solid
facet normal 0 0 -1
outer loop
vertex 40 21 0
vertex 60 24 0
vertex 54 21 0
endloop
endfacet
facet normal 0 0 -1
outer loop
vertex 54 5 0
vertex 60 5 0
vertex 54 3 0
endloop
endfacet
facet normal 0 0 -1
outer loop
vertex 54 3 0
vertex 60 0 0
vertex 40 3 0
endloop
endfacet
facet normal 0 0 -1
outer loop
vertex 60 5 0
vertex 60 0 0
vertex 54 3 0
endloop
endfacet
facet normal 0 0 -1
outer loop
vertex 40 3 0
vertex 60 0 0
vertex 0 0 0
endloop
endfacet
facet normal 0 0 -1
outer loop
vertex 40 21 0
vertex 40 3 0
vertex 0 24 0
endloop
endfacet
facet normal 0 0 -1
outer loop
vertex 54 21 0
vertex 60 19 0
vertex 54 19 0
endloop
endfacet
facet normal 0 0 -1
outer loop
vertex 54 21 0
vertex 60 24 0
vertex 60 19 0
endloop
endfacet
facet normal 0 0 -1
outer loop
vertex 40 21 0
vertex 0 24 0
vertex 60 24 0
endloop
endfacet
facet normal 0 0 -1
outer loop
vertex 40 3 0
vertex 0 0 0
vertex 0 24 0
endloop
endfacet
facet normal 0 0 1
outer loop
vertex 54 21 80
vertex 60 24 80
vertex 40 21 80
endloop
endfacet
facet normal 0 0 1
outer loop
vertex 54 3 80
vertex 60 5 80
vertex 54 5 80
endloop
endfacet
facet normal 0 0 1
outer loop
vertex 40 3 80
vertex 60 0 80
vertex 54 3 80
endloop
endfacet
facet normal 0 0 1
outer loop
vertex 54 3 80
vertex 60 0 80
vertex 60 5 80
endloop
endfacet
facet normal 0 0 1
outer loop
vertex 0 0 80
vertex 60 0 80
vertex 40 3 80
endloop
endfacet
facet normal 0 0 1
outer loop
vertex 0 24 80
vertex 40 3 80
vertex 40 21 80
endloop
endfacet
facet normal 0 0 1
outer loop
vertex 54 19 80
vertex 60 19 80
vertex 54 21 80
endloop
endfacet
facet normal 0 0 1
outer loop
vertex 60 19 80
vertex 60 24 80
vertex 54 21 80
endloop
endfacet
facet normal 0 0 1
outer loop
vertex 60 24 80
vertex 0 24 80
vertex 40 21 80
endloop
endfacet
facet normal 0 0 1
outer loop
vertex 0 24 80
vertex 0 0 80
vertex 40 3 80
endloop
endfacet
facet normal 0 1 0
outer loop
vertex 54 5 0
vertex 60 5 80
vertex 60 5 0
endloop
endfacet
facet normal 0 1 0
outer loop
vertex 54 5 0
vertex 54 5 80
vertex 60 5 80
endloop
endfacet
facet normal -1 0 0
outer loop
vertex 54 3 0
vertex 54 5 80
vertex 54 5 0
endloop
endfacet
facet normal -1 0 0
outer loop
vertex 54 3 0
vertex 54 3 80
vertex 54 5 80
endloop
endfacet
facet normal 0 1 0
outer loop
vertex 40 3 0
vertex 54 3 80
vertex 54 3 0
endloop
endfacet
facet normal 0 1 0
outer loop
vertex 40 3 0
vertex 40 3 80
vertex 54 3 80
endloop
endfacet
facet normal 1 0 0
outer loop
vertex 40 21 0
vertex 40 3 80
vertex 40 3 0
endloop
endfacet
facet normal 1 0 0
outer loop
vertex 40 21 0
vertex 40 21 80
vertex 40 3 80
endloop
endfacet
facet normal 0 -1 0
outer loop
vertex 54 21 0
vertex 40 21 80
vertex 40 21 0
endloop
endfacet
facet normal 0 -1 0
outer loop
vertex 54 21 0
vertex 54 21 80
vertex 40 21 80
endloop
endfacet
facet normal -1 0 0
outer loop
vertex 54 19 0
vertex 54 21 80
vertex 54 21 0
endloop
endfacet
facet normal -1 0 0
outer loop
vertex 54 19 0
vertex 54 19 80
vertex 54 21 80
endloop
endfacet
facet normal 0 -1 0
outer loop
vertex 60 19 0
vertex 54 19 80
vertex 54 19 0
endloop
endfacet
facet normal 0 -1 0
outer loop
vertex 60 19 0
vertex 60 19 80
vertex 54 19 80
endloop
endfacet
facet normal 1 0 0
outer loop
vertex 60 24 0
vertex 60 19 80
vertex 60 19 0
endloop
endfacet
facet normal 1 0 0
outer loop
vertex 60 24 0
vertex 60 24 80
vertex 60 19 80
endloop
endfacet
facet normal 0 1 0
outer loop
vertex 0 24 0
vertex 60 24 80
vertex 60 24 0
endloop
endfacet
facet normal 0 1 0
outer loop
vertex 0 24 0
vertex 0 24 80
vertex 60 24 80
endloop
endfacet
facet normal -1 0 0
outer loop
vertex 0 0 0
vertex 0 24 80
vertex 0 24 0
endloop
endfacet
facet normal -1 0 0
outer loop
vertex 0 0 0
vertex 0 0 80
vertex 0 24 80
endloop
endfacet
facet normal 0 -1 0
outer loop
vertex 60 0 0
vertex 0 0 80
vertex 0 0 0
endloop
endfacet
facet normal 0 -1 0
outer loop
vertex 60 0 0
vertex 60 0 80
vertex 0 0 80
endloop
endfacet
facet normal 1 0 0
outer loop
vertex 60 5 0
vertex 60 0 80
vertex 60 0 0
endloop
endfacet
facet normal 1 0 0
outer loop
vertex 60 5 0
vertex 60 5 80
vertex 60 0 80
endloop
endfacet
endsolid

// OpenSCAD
$fn = 32;

// ----------------------------------------------------------------------
// T-slot rail: 60 x 24 mm section, 80 mm long
// ----------------------------------------------------------------------

// --- parameters (mm) ---
profile_height = 80;      // extrusion height
profile_points = 12;      // points of the closed outline

profile = [[0, 0], [60, 0], [60, 5], [54, 5], [54, 3], [40, 3], [40, 21], [54, 21], [54, 19], [60, 19], [60, 24], [0, 24]];  // single closed polygon, 12 points, counter clockwise

// --- the one profile operation ---
linear_extrude(height = profile_height) polygon(points = profile);
